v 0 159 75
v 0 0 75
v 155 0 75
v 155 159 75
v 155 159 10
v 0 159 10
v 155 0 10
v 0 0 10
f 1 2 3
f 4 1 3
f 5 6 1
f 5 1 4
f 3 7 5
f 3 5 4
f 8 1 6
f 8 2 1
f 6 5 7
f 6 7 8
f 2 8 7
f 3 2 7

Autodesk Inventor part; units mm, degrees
ref_plane "YZ Plane" through (0, 0, 0) normal (1, 0, 0) x (0, 1, 0)
ref_plane "XZ Plane" through (0, 0, 0) normal (0, 1, 0) x (-1, 0, 0)
ref_plane "XY Plane" through (0, 0, 0) normal (0, 0, 1) x (1, 0, 0)
sketch "Sketch2" plane through (0, 0, 0) normal (0, 0, 1) x (1, 0, 0)
  line L0 (0, 0) -> (135, 0)
  line L1 (135, 0) -> (135, 139)
  line L2 (135, 139) -> (0, 139)
  line L3 (0, 139) -> (0, 0)
  dimension "d4" = 135
  dimension "d5" = 139
extrude "Extrusion2" add sketch "Sketch2" along normal blind 75
sketch "Sketch3" plane through (135, 0, 0) normal (1, 0, 0) x (0, 0, -1)
  line L0 (0, 139) -> (-75, 139) projected
  line L1 (-75, 139) -> (0, 139)
  line L2 (0, 139) -> (0, 0)
  line L3 (0, 0) -> (-75, 0)
  line L4 (-75, 0) -> (-75, 139)
extrude "Extrusion3" add sketch "Sketch3" along normal blind 20
sketch "Sketch4" plane through (0, 139, 75) normal (0, 1, 0) x (1, 0, 0)
  line L0 (0, 0) -> (155, 0) projected
  line L1 (0, 75) -> (155, 75)
  line L2 (155, 75) -> (155, 0)
  line L3 (155, 0) -> (0, 0)
  line L4 (0, 0) -> (0, 75)
extrude "Extrusion4" add sketch "Sketch4" along normal blind 20
sketch "Sketch5" plane through (0, 0, 0) normal (0, 0, -1) x (-1, 0, 0)
  line L0 (-155, 0) -> (-155, 159) projected
  line L1 (-155, 159) -> (0, 159)
  line L2 (0, 159) -> (0, 0)
  line L3 (0, 0) -> (-155, 0)
  line L4 (-155, 0) -> (-155, 159)
extrude "Extrusion5" cut sketch "Sketch5" against normal blind 10
properties part number "Battery"
